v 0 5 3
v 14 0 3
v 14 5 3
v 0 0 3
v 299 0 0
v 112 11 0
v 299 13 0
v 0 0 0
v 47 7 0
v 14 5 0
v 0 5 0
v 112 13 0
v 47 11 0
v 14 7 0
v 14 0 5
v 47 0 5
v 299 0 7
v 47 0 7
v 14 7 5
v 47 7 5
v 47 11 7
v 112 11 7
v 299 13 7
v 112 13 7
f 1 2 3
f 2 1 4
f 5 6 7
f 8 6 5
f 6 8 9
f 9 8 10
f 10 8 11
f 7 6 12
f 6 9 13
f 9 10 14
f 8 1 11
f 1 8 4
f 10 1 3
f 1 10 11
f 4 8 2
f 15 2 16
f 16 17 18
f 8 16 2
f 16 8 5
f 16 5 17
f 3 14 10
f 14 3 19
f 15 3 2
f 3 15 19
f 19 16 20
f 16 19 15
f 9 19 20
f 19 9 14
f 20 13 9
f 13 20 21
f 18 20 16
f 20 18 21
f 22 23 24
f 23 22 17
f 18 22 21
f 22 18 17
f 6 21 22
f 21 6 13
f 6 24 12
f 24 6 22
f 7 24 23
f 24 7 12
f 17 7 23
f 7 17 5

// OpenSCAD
translate([1.0, 2.5, 1.5]) color([0.901262330417864, 0.44129738363616366, 0.3715965769686672]) cube([2, 5, 3], center=true);
translate([3.0, 2.5, 1.5]) color([0.9523409342086877, 0.09105648808381206, 0.18545820412424963]) cube([2, 5, 3], center=true);
translate([5.0, 2.5, 1.5]) color([0.10861526636012075, 0.11215874223546374, 0.6055458611860893]) cube([2, 5, 3], center=true);
translate([7.0, 2.5, 1.5]) color([0.15387883630139487, 0.7025980908137885, 0.928268212070889]) cube([2, 5, 3], center=true);
translate([9.0, 2.5, 1.5]) color([0.18538068806857422, 0.42170431041506296, 0.1747372019883816]) cube([2, 5, 3], center=true);
translate([11.0, 2.5, 1.5]) color([0.9595322940755414, 0.3403879026852894, 0.5233486454380116]) cube([2, 5, 3], center=true);
translate([13.0, 2.5, 1.5]) color([0.35536744790103547, 0.6315169232882821, 0.08649939658707362]) cube([2, 5, 3], center=true);
translate([15.5, 3.5, 2.5]) color([0.7550350740823142, 0.2947283238309857, 0.8301737658604361]) cube([3, 7, 5], center=true);
translate([18.5, 3.5, 2.5]) color([0.4490883769000732, 0.4620108455998946, 0.2187341846418389]) cube([3, 7, 5], center=true);
translate([21.5, 3.5, 2.5]) color([0.11445722556586746, 0.9788025142917065, 0.3011589686960586]) cube([3, 7, 5], center=true);
translate([24.5, 3.5, 2.5]) color([0.6091605287508749, 0.4242090709976407, 0.7513524999576429]) cube([3, 7, 5], center=true);
translate([27.5, 3.5, 2.5]) color([0.09255304692818778, 0.4976795968420046, 0.9609180855182016]) cube([3, 7, 5], center=true);
translate([30.5, 3.5, 2.5]) color([0.5437408220916614, 0.405305104554358, 0.6320656015278037]) cube([3, 7, 5], center=true);
translate([33.5, 3.5, 2.5]) color([0.0216193804206819, 0.2700784048715086, 0.6684886667173141]) cube([3, 7, 5], center=true);
translate([36.5, 3.5, 2.5]) color([0.0002532098932251925, 0.3984286079265319, 0.8905618085087551]) cube([3, 7, 5], center=true);
translate([39.5, 3.5, 2.5]) color([0.7099647178965433, 0.4445845492335537, 0.7465509493098265]) cube([3, 7, 5], center=true);
translate([42.5, 3.5, 2.5]) color([0.35382203223851694, 0.8712980207444939, 0.6725473918674463]) cube([3, 7, 5], center=true);
translate([45.5, 3.5, 2.5]) color([0.19603088941730495, 0.08525923665948931, 0.0704556688087915]) cube([3, 7, 5], center=true);
translate([49.5, 5.5, 3.5]) color([0.26248678792717994, 0.533638651221174, 0.11818482376773232]) cube([5, 11, 7], center=true);
translate([54.5, 5.5, 3.5]) color([0.8594532404023933, 0.8906989166138923, 0.7620005545284954]) cube([5, 11, 7], center=true);
translate([59.5, 5.5, 3.5]) color([0.06809296768032302, 0.8609410769469436, 0.2827478909480132]) cube([5, 11, 7], center=true);
translate([64.5, 5.5, 3.5]) color([0.13442052583382869, 0.5230599837537087, 0.21027834364306774]) cube([5, 11, 7], center=true);
translate([69.5, 5.5, 3.5]) color([0.10530639745894443, 0.9556548717215211, 0.5435731515542631]) cube([5, 11, 7], center=true);
translate([74.5, 5.5, 3.5]) color([0.7414270622920264, 0.9040457292510377, 0.2786145977098805]) cube([5, 11, 7], center=true);
translate([79.5, 5.5, 3.5]) color([0.4423646135017597, 0.5682329433322765, 0.13781274972163116]) cube([5, 11, 7], center=true);
translate([84.5, 5.5, 3.5]) color([0.1232982180791492, 0.12051785276403837, 0.4012165411640888]) cube([5, 11, 7], center=true);
translate([89.5, 5.5, 3.5]) color([0.4679428423906348, 0.5596131508667647, 0.29896126951320356]) cube([5, 11, 7], center=true);
translate([94.5, 5.5, 3.5]) color([0.6321114709426877, 0.7423454703026071, 0.21800995973285464]) cube([5, 11, 7], center=true);
translate([99.5, 5.5, 3.5]) color([0.48885816108208613, 0.501567157493831, 0.49271975198428686]) cube([5, 11, 7], center=true);
translate([104.5, 5.5, 3.5]) color([0.958422556968198, 0.44398175403613704, 0.14281143058247625]) cube([5, 11, 7], center=true);
translate([109.5, 5.5, 3.5]) color([0.4955231327742775, 0.8873352305676206, 0.21571394075115613]) cube([5, 11, 7], center=true);
translate([117.5, 6.5, 3.5]) color([0.3554013630116646, 0.39096604949642, 0.9928835035123682]) cube([11, 13, 7], center=true);
translate([128.5, 6.5, 3.5]) color([0.8462248334797323, 0.9789066021625461, 0.6868956228130294]) cube([11, 13, 7], center=true);
translate([139.5, 6.5, 3.5]) color([0.08137290691060206, 0.9493092651810784, 0.9246190463677613]) cube([11, 13, 7], center=true);
translate([150.5, 6.5, 3.5]) color([0.3951154575230438, 0.3612783181755085, 0.11615210489091876]) cube([11, 13, 7], center=true);
translate([161.5, 6.5, 3.5]) color([0.0037403702712440756, 0.2703277384724262, 0.6403732426441148]) cube([11, 13, 7], center=true);
translate([172.5, 6.5, 3.5]) color([0.29252642189785794, 0.9007258804640697, 0.14067978971908934]) cube([11, 13, 7], center=true);
translate([183.5, 6.5, 3.5]) color([0.5728503338092871, 0.1912043400515635, 0.43401891336511733]) cube([11, 13, 7], center=true);
translate([194.5, 6.5, 3.5]) color([0.7163457448050065, 0.3841301513333275, 0.33069552050314754]) cube([11, 13, 7], center=true);
translate([205.5, 6.5, 3.5]) color([0.6480049557775331, 0.6874717059379091, 0.14801928734251768]) cube([11, 13, 7], center=true);
translate([216.5, 6.5, 3.5]) color([0.93323205939552, 0.14750072005511716, 0.31607169754224296]) cube([11, 13, 7], center=true);
translate([227.5, 6.5, 3.5]) color([0.2088660889148145, 0.1868244368145192, 0.3491672112743387]) cube([11, 13, 7], center=true);
translate([238.5, 6.5, 3.5]) color([0.9834841816788549, 0.427290207198605, 0.49195852420878716]) cube([11, 13, 7], center=true);
translate([249.5, 6.5, 3.5]) color([0.7297831417632067, 0.7955834433152874, 0.43927203819181504]) cube([11, 13, 7], center=true);
translate([260.5, 6.5, 3.5]) color([0.2042687131951023, 0.709997013582239, 0.9058221085991531]) cube([11, 13, 7], center=true);
translate([271.5, 6.5, 3.5]) color([0.03327924187503195, 0.6331757983912308, 0.8710093735661795]) cube([11, 13, 7], center=true);
translate([282.5, 6.5, 3.5]) color([0.3636101637556439, 0.7431628081058981, 0.6774926049513658]) cube([11, 13, 7], center=true);
translate([293.5, 6.5, 3.5]) color([0.23306417175218364, 0.2975271762349214, 0.0866296567389645]) cube([11, 13, 7], center=true);
